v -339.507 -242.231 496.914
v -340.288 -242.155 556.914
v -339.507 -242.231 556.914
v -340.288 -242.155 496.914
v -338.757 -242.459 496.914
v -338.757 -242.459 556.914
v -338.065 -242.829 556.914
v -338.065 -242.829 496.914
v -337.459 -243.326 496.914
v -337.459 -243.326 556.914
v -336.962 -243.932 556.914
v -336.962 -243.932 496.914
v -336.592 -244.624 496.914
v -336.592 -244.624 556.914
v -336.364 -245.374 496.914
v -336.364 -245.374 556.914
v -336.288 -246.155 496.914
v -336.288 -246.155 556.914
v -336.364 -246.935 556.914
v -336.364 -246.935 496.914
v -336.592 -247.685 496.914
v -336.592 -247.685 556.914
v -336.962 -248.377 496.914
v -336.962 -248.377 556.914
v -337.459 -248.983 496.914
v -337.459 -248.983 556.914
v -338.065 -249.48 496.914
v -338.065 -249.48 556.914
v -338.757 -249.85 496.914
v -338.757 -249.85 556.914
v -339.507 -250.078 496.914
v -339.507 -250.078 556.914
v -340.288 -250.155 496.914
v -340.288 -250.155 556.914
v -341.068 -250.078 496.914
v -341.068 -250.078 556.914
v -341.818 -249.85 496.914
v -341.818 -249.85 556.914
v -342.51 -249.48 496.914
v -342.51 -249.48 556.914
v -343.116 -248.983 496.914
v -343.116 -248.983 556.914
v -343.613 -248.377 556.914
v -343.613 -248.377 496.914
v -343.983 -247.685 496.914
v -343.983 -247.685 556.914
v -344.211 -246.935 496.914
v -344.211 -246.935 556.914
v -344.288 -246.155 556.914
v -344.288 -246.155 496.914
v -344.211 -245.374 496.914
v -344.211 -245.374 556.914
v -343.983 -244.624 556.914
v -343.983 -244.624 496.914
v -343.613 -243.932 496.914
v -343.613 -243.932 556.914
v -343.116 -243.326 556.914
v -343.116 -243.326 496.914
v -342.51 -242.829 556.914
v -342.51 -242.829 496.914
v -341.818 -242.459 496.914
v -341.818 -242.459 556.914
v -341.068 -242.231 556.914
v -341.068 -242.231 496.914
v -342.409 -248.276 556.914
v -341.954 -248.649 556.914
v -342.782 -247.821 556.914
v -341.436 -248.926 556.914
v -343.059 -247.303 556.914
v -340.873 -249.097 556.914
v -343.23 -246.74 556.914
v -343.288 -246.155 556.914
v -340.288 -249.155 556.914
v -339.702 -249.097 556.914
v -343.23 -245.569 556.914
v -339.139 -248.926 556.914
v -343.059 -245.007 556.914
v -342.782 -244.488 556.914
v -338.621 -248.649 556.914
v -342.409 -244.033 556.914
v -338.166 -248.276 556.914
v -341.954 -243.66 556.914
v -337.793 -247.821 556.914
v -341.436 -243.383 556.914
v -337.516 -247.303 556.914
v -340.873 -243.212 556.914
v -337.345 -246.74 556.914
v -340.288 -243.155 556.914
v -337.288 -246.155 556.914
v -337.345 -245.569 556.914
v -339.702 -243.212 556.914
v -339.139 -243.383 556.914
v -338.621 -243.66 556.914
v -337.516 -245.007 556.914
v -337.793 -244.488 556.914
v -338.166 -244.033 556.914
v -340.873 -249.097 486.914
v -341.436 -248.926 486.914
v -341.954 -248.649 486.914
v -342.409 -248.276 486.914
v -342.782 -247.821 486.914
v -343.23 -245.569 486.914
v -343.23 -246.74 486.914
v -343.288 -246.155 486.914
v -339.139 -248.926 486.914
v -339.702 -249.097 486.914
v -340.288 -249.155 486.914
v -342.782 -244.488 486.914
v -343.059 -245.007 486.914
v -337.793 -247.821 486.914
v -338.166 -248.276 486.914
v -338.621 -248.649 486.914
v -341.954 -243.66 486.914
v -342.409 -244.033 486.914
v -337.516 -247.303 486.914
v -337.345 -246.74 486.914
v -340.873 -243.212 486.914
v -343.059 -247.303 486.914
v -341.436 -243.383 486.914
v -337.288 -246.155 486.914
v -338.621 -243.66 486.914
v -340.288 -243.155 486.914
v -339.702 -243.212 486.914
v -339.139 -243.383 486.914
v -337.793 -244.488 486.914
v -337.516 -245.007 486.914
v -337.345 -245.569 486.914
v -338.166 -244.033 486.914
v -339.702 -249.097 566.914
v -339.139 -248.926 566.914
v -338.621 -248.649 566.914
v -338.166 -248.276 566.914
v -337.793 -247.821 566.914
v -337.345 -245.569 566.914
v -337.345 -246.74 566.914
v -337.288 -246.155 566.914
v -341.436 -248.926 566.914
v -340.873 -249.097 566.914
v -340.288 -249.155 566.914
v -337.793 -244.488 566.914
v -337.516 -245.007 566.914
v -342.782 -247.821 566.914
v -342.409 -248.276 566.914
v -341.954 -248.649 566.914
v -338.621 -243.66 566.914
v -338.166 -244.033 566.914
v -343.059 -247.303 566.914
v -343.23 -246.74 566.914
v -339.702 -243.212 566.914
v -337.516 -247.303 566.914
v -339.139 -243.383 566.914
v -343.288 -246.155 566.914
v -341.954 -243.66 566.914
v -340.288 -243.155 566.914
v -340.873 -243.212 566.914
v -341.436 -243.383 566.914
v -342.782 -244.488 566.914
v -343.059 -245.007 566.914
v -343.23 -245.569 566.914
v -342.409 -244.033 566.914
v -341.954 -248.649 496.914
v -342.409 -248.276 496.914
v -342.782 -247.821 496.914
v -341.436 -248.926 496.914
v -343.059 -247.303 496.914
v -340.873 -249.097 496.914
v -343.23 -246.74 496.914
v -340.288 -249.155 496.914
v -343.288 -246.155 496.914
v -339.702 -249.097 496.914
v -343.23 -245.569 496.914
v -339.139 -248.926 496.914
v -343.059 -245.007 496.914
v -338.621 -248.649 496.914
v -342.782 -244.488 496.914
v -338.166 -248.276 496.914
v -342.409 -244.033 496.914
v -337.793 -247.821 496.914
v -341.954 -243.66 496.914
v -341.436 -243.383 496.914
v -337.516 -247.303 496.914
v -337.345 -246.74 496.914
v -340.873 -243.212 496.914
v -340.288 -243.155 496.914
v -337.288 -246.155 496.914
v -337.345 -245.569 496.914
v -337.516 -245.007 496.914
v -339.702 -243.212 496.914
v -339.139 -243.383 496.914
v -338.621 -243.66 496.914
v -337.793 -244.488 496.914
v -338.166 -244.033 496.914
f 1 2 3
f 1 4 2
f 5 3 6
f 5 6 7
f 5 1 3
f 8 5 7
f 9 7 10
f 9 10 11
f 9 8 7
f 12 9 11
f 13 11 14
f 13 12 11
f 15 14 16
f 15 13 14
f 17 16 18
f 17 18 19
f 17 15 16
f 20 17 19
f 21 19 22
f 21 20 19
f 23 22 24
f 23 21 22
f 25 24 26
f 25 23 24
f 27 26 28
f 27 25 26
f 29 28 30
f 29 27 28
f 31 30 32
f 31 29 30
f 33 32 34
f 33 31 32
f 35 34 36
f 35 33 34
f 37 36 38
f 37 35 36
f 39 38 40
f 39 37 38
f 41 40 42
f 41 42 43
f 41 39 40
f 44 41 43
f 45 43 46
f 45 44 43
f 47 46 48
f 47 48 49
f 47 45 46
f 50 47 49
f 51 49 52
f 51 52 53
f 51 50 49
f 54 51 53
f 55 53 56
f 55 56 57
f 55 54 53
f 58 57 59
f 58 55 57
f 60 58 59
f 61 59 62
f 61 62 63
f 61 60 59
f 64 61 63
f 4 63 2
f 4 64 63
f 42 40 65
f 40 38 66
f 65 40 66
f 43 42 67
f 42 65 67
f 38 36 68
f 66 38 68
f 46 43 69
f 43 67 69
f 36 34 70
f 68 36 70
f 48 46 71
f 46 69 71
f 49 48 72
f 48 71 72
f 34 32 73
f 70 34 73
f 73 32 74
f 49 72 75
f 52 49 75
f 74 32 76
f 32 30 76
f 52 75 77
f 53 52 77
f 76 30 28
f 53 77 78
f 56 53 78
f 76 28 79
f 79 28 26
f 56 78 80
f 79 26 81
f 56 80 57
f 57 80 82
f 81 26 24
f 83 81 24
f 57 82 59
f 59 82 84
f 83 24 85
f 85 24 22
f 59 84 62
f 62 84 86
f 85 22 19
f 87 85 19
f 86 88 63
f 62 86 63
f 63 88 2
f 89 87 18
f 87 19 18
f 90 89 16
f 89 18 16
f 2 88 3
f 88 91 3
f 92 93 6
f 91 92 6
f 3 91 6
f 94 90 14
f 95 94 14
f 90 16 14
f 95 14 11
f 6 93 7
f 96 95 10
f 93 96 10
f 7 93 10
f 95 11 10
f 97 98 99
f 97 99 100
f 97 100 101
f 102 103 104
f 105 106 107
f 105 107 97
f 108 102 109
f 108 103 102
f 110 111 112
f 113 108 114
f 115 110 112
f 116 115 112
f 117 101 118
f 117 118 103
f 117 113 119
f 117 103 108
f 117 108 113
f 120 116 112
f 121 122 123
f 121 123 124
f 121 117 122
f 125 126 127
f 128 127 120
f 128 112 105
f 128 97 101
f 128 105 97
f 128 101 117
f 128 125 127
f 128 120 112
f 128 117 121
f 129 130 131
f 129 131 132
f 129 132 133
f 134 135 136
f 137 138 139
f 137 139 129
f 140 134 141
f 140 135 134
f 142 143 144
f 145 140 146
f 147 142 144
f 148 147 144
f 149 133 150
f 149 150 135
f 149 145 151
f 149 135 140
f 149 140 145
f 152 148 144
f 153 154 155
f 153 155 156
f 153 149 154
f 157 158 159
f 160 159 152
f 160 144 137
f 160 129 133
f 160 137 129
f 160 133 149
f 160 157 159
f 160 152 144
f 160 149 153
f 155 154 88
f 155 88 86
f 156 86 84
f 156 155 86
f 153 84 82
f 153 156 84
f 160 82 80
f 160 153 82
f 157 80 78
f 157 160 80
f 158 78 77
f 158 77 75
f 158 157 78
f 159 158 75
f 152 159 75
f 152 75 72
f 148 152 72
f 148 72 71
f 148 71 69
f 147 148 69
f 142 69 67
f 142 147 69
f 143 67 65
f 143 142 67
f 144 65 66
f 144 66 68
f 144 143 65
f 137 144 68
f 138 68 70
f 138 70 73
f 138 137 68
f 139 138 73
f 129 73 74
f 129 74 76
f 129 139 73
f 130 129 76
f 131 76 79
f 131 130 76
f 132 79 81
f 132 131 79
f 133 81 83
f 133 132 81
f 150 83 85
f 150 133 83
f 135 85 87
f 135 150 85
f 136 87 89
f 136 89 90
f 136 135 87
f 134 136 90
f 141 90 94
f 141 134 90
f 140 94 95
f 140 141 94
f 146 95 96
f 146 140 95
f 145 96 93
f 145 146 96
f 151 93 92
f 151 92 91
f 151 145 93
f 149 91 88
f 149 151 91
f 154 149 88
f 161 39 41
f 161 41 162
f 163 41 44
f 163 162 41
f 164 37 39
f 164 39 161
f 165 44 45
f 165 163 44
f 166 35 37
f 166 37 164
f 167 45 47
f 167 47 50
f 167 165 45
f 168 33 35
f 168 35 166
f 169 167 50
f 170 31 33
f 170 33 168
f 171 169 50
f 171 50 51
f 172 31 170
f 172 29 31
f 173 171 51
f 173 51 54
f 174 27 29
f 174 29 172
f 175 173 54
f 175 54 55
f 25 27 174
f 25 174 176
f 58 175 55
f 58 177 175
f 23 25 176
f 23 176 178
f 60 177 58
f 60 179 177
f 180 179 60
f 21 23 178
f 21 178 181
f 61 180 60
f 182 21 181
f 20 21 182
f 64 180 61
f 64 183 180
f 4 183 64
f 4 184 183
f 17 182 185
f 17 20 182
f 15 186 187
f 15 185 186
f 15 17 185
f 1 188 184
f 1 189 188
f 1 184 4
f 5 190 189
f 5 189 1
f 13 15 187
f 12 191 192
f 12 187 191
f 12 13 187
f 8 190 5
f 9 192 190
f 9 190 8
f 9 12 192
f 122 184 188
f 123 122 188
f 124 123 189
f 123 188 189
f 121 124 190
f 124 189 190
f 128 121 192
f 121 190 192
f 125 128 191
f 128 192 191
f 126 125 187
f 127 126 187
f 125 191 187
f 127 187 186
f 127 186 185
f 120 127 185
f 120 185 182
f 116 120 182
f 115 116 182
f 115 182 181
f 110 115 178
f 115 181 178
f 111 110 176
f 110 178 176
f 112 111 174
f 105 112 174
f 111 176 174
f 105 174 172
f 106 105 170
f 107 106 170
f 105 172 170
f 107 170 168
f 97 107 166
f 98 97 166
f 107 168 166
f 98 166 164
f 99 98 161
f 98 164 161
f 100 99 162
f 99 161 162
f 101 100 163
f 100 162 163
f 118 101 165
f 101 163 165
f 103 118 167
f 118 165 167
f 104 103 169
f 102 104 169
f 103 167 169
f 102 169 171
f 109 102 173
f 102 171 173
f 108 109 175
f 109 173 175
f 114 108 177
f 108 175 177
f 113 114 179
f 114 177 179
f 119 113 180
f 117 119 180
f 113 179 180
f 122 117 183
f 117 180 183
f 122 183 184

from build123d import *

# Parameters (mm, degrees)
SKETCH_1_R      = 4
EXTRUDE_1_DEPTH = 30
SKETCH_2_R      = 3
EXTRUDE_2_DEPTH = 10
EXTRUDE_START   = 10
SKETCH_3_R      = 3
EXTRUDE_3_DEPTH = 10


with BuildPart() as part:
    # 草图1 → 凸台-拉伸1 (new, symmetric)
    with BuildSketch(Plane(origin=(0, 0, 526.914147293), x_dir=(-1, 0, 0), z_dir=(0, 0, -1))):
        with Locations(Location((340.287512766, -246.15455511, 0), (0, 0, 90))):
            Circle(SKETCH_1_R)
    extrude(amount=EXTRUDE_1_DEPTH, both=True)

    # 草图2 → 凸台-拉伸2 (add)
    with BuildSketch(Plane(origin=(0, 0, 496.914147293), x_dir=(-1, 0, 0), z_dir=(0, 0, -1))):
        with Locations(Location((340.287512766, -246.15455511, 0), (0, 0, 90))):
            Circle(SKETCH_2_R)
    extrude(amount=EXTRUDE_2_DEPTH)

    # 草图3 → 凸台-拉伸3 (add)
    with BuildSketch(Plane.XY.offset(556.914147293).offset(EXTRUDE_START)):
        with Locations(Location((-340.287512766, -246.15455511, 0), (0, 0, 90))):
            Circle(SKETCH_3_R)
    extrude(amount=-EXTRUDE_3_DEPTH)


solid = part.part
